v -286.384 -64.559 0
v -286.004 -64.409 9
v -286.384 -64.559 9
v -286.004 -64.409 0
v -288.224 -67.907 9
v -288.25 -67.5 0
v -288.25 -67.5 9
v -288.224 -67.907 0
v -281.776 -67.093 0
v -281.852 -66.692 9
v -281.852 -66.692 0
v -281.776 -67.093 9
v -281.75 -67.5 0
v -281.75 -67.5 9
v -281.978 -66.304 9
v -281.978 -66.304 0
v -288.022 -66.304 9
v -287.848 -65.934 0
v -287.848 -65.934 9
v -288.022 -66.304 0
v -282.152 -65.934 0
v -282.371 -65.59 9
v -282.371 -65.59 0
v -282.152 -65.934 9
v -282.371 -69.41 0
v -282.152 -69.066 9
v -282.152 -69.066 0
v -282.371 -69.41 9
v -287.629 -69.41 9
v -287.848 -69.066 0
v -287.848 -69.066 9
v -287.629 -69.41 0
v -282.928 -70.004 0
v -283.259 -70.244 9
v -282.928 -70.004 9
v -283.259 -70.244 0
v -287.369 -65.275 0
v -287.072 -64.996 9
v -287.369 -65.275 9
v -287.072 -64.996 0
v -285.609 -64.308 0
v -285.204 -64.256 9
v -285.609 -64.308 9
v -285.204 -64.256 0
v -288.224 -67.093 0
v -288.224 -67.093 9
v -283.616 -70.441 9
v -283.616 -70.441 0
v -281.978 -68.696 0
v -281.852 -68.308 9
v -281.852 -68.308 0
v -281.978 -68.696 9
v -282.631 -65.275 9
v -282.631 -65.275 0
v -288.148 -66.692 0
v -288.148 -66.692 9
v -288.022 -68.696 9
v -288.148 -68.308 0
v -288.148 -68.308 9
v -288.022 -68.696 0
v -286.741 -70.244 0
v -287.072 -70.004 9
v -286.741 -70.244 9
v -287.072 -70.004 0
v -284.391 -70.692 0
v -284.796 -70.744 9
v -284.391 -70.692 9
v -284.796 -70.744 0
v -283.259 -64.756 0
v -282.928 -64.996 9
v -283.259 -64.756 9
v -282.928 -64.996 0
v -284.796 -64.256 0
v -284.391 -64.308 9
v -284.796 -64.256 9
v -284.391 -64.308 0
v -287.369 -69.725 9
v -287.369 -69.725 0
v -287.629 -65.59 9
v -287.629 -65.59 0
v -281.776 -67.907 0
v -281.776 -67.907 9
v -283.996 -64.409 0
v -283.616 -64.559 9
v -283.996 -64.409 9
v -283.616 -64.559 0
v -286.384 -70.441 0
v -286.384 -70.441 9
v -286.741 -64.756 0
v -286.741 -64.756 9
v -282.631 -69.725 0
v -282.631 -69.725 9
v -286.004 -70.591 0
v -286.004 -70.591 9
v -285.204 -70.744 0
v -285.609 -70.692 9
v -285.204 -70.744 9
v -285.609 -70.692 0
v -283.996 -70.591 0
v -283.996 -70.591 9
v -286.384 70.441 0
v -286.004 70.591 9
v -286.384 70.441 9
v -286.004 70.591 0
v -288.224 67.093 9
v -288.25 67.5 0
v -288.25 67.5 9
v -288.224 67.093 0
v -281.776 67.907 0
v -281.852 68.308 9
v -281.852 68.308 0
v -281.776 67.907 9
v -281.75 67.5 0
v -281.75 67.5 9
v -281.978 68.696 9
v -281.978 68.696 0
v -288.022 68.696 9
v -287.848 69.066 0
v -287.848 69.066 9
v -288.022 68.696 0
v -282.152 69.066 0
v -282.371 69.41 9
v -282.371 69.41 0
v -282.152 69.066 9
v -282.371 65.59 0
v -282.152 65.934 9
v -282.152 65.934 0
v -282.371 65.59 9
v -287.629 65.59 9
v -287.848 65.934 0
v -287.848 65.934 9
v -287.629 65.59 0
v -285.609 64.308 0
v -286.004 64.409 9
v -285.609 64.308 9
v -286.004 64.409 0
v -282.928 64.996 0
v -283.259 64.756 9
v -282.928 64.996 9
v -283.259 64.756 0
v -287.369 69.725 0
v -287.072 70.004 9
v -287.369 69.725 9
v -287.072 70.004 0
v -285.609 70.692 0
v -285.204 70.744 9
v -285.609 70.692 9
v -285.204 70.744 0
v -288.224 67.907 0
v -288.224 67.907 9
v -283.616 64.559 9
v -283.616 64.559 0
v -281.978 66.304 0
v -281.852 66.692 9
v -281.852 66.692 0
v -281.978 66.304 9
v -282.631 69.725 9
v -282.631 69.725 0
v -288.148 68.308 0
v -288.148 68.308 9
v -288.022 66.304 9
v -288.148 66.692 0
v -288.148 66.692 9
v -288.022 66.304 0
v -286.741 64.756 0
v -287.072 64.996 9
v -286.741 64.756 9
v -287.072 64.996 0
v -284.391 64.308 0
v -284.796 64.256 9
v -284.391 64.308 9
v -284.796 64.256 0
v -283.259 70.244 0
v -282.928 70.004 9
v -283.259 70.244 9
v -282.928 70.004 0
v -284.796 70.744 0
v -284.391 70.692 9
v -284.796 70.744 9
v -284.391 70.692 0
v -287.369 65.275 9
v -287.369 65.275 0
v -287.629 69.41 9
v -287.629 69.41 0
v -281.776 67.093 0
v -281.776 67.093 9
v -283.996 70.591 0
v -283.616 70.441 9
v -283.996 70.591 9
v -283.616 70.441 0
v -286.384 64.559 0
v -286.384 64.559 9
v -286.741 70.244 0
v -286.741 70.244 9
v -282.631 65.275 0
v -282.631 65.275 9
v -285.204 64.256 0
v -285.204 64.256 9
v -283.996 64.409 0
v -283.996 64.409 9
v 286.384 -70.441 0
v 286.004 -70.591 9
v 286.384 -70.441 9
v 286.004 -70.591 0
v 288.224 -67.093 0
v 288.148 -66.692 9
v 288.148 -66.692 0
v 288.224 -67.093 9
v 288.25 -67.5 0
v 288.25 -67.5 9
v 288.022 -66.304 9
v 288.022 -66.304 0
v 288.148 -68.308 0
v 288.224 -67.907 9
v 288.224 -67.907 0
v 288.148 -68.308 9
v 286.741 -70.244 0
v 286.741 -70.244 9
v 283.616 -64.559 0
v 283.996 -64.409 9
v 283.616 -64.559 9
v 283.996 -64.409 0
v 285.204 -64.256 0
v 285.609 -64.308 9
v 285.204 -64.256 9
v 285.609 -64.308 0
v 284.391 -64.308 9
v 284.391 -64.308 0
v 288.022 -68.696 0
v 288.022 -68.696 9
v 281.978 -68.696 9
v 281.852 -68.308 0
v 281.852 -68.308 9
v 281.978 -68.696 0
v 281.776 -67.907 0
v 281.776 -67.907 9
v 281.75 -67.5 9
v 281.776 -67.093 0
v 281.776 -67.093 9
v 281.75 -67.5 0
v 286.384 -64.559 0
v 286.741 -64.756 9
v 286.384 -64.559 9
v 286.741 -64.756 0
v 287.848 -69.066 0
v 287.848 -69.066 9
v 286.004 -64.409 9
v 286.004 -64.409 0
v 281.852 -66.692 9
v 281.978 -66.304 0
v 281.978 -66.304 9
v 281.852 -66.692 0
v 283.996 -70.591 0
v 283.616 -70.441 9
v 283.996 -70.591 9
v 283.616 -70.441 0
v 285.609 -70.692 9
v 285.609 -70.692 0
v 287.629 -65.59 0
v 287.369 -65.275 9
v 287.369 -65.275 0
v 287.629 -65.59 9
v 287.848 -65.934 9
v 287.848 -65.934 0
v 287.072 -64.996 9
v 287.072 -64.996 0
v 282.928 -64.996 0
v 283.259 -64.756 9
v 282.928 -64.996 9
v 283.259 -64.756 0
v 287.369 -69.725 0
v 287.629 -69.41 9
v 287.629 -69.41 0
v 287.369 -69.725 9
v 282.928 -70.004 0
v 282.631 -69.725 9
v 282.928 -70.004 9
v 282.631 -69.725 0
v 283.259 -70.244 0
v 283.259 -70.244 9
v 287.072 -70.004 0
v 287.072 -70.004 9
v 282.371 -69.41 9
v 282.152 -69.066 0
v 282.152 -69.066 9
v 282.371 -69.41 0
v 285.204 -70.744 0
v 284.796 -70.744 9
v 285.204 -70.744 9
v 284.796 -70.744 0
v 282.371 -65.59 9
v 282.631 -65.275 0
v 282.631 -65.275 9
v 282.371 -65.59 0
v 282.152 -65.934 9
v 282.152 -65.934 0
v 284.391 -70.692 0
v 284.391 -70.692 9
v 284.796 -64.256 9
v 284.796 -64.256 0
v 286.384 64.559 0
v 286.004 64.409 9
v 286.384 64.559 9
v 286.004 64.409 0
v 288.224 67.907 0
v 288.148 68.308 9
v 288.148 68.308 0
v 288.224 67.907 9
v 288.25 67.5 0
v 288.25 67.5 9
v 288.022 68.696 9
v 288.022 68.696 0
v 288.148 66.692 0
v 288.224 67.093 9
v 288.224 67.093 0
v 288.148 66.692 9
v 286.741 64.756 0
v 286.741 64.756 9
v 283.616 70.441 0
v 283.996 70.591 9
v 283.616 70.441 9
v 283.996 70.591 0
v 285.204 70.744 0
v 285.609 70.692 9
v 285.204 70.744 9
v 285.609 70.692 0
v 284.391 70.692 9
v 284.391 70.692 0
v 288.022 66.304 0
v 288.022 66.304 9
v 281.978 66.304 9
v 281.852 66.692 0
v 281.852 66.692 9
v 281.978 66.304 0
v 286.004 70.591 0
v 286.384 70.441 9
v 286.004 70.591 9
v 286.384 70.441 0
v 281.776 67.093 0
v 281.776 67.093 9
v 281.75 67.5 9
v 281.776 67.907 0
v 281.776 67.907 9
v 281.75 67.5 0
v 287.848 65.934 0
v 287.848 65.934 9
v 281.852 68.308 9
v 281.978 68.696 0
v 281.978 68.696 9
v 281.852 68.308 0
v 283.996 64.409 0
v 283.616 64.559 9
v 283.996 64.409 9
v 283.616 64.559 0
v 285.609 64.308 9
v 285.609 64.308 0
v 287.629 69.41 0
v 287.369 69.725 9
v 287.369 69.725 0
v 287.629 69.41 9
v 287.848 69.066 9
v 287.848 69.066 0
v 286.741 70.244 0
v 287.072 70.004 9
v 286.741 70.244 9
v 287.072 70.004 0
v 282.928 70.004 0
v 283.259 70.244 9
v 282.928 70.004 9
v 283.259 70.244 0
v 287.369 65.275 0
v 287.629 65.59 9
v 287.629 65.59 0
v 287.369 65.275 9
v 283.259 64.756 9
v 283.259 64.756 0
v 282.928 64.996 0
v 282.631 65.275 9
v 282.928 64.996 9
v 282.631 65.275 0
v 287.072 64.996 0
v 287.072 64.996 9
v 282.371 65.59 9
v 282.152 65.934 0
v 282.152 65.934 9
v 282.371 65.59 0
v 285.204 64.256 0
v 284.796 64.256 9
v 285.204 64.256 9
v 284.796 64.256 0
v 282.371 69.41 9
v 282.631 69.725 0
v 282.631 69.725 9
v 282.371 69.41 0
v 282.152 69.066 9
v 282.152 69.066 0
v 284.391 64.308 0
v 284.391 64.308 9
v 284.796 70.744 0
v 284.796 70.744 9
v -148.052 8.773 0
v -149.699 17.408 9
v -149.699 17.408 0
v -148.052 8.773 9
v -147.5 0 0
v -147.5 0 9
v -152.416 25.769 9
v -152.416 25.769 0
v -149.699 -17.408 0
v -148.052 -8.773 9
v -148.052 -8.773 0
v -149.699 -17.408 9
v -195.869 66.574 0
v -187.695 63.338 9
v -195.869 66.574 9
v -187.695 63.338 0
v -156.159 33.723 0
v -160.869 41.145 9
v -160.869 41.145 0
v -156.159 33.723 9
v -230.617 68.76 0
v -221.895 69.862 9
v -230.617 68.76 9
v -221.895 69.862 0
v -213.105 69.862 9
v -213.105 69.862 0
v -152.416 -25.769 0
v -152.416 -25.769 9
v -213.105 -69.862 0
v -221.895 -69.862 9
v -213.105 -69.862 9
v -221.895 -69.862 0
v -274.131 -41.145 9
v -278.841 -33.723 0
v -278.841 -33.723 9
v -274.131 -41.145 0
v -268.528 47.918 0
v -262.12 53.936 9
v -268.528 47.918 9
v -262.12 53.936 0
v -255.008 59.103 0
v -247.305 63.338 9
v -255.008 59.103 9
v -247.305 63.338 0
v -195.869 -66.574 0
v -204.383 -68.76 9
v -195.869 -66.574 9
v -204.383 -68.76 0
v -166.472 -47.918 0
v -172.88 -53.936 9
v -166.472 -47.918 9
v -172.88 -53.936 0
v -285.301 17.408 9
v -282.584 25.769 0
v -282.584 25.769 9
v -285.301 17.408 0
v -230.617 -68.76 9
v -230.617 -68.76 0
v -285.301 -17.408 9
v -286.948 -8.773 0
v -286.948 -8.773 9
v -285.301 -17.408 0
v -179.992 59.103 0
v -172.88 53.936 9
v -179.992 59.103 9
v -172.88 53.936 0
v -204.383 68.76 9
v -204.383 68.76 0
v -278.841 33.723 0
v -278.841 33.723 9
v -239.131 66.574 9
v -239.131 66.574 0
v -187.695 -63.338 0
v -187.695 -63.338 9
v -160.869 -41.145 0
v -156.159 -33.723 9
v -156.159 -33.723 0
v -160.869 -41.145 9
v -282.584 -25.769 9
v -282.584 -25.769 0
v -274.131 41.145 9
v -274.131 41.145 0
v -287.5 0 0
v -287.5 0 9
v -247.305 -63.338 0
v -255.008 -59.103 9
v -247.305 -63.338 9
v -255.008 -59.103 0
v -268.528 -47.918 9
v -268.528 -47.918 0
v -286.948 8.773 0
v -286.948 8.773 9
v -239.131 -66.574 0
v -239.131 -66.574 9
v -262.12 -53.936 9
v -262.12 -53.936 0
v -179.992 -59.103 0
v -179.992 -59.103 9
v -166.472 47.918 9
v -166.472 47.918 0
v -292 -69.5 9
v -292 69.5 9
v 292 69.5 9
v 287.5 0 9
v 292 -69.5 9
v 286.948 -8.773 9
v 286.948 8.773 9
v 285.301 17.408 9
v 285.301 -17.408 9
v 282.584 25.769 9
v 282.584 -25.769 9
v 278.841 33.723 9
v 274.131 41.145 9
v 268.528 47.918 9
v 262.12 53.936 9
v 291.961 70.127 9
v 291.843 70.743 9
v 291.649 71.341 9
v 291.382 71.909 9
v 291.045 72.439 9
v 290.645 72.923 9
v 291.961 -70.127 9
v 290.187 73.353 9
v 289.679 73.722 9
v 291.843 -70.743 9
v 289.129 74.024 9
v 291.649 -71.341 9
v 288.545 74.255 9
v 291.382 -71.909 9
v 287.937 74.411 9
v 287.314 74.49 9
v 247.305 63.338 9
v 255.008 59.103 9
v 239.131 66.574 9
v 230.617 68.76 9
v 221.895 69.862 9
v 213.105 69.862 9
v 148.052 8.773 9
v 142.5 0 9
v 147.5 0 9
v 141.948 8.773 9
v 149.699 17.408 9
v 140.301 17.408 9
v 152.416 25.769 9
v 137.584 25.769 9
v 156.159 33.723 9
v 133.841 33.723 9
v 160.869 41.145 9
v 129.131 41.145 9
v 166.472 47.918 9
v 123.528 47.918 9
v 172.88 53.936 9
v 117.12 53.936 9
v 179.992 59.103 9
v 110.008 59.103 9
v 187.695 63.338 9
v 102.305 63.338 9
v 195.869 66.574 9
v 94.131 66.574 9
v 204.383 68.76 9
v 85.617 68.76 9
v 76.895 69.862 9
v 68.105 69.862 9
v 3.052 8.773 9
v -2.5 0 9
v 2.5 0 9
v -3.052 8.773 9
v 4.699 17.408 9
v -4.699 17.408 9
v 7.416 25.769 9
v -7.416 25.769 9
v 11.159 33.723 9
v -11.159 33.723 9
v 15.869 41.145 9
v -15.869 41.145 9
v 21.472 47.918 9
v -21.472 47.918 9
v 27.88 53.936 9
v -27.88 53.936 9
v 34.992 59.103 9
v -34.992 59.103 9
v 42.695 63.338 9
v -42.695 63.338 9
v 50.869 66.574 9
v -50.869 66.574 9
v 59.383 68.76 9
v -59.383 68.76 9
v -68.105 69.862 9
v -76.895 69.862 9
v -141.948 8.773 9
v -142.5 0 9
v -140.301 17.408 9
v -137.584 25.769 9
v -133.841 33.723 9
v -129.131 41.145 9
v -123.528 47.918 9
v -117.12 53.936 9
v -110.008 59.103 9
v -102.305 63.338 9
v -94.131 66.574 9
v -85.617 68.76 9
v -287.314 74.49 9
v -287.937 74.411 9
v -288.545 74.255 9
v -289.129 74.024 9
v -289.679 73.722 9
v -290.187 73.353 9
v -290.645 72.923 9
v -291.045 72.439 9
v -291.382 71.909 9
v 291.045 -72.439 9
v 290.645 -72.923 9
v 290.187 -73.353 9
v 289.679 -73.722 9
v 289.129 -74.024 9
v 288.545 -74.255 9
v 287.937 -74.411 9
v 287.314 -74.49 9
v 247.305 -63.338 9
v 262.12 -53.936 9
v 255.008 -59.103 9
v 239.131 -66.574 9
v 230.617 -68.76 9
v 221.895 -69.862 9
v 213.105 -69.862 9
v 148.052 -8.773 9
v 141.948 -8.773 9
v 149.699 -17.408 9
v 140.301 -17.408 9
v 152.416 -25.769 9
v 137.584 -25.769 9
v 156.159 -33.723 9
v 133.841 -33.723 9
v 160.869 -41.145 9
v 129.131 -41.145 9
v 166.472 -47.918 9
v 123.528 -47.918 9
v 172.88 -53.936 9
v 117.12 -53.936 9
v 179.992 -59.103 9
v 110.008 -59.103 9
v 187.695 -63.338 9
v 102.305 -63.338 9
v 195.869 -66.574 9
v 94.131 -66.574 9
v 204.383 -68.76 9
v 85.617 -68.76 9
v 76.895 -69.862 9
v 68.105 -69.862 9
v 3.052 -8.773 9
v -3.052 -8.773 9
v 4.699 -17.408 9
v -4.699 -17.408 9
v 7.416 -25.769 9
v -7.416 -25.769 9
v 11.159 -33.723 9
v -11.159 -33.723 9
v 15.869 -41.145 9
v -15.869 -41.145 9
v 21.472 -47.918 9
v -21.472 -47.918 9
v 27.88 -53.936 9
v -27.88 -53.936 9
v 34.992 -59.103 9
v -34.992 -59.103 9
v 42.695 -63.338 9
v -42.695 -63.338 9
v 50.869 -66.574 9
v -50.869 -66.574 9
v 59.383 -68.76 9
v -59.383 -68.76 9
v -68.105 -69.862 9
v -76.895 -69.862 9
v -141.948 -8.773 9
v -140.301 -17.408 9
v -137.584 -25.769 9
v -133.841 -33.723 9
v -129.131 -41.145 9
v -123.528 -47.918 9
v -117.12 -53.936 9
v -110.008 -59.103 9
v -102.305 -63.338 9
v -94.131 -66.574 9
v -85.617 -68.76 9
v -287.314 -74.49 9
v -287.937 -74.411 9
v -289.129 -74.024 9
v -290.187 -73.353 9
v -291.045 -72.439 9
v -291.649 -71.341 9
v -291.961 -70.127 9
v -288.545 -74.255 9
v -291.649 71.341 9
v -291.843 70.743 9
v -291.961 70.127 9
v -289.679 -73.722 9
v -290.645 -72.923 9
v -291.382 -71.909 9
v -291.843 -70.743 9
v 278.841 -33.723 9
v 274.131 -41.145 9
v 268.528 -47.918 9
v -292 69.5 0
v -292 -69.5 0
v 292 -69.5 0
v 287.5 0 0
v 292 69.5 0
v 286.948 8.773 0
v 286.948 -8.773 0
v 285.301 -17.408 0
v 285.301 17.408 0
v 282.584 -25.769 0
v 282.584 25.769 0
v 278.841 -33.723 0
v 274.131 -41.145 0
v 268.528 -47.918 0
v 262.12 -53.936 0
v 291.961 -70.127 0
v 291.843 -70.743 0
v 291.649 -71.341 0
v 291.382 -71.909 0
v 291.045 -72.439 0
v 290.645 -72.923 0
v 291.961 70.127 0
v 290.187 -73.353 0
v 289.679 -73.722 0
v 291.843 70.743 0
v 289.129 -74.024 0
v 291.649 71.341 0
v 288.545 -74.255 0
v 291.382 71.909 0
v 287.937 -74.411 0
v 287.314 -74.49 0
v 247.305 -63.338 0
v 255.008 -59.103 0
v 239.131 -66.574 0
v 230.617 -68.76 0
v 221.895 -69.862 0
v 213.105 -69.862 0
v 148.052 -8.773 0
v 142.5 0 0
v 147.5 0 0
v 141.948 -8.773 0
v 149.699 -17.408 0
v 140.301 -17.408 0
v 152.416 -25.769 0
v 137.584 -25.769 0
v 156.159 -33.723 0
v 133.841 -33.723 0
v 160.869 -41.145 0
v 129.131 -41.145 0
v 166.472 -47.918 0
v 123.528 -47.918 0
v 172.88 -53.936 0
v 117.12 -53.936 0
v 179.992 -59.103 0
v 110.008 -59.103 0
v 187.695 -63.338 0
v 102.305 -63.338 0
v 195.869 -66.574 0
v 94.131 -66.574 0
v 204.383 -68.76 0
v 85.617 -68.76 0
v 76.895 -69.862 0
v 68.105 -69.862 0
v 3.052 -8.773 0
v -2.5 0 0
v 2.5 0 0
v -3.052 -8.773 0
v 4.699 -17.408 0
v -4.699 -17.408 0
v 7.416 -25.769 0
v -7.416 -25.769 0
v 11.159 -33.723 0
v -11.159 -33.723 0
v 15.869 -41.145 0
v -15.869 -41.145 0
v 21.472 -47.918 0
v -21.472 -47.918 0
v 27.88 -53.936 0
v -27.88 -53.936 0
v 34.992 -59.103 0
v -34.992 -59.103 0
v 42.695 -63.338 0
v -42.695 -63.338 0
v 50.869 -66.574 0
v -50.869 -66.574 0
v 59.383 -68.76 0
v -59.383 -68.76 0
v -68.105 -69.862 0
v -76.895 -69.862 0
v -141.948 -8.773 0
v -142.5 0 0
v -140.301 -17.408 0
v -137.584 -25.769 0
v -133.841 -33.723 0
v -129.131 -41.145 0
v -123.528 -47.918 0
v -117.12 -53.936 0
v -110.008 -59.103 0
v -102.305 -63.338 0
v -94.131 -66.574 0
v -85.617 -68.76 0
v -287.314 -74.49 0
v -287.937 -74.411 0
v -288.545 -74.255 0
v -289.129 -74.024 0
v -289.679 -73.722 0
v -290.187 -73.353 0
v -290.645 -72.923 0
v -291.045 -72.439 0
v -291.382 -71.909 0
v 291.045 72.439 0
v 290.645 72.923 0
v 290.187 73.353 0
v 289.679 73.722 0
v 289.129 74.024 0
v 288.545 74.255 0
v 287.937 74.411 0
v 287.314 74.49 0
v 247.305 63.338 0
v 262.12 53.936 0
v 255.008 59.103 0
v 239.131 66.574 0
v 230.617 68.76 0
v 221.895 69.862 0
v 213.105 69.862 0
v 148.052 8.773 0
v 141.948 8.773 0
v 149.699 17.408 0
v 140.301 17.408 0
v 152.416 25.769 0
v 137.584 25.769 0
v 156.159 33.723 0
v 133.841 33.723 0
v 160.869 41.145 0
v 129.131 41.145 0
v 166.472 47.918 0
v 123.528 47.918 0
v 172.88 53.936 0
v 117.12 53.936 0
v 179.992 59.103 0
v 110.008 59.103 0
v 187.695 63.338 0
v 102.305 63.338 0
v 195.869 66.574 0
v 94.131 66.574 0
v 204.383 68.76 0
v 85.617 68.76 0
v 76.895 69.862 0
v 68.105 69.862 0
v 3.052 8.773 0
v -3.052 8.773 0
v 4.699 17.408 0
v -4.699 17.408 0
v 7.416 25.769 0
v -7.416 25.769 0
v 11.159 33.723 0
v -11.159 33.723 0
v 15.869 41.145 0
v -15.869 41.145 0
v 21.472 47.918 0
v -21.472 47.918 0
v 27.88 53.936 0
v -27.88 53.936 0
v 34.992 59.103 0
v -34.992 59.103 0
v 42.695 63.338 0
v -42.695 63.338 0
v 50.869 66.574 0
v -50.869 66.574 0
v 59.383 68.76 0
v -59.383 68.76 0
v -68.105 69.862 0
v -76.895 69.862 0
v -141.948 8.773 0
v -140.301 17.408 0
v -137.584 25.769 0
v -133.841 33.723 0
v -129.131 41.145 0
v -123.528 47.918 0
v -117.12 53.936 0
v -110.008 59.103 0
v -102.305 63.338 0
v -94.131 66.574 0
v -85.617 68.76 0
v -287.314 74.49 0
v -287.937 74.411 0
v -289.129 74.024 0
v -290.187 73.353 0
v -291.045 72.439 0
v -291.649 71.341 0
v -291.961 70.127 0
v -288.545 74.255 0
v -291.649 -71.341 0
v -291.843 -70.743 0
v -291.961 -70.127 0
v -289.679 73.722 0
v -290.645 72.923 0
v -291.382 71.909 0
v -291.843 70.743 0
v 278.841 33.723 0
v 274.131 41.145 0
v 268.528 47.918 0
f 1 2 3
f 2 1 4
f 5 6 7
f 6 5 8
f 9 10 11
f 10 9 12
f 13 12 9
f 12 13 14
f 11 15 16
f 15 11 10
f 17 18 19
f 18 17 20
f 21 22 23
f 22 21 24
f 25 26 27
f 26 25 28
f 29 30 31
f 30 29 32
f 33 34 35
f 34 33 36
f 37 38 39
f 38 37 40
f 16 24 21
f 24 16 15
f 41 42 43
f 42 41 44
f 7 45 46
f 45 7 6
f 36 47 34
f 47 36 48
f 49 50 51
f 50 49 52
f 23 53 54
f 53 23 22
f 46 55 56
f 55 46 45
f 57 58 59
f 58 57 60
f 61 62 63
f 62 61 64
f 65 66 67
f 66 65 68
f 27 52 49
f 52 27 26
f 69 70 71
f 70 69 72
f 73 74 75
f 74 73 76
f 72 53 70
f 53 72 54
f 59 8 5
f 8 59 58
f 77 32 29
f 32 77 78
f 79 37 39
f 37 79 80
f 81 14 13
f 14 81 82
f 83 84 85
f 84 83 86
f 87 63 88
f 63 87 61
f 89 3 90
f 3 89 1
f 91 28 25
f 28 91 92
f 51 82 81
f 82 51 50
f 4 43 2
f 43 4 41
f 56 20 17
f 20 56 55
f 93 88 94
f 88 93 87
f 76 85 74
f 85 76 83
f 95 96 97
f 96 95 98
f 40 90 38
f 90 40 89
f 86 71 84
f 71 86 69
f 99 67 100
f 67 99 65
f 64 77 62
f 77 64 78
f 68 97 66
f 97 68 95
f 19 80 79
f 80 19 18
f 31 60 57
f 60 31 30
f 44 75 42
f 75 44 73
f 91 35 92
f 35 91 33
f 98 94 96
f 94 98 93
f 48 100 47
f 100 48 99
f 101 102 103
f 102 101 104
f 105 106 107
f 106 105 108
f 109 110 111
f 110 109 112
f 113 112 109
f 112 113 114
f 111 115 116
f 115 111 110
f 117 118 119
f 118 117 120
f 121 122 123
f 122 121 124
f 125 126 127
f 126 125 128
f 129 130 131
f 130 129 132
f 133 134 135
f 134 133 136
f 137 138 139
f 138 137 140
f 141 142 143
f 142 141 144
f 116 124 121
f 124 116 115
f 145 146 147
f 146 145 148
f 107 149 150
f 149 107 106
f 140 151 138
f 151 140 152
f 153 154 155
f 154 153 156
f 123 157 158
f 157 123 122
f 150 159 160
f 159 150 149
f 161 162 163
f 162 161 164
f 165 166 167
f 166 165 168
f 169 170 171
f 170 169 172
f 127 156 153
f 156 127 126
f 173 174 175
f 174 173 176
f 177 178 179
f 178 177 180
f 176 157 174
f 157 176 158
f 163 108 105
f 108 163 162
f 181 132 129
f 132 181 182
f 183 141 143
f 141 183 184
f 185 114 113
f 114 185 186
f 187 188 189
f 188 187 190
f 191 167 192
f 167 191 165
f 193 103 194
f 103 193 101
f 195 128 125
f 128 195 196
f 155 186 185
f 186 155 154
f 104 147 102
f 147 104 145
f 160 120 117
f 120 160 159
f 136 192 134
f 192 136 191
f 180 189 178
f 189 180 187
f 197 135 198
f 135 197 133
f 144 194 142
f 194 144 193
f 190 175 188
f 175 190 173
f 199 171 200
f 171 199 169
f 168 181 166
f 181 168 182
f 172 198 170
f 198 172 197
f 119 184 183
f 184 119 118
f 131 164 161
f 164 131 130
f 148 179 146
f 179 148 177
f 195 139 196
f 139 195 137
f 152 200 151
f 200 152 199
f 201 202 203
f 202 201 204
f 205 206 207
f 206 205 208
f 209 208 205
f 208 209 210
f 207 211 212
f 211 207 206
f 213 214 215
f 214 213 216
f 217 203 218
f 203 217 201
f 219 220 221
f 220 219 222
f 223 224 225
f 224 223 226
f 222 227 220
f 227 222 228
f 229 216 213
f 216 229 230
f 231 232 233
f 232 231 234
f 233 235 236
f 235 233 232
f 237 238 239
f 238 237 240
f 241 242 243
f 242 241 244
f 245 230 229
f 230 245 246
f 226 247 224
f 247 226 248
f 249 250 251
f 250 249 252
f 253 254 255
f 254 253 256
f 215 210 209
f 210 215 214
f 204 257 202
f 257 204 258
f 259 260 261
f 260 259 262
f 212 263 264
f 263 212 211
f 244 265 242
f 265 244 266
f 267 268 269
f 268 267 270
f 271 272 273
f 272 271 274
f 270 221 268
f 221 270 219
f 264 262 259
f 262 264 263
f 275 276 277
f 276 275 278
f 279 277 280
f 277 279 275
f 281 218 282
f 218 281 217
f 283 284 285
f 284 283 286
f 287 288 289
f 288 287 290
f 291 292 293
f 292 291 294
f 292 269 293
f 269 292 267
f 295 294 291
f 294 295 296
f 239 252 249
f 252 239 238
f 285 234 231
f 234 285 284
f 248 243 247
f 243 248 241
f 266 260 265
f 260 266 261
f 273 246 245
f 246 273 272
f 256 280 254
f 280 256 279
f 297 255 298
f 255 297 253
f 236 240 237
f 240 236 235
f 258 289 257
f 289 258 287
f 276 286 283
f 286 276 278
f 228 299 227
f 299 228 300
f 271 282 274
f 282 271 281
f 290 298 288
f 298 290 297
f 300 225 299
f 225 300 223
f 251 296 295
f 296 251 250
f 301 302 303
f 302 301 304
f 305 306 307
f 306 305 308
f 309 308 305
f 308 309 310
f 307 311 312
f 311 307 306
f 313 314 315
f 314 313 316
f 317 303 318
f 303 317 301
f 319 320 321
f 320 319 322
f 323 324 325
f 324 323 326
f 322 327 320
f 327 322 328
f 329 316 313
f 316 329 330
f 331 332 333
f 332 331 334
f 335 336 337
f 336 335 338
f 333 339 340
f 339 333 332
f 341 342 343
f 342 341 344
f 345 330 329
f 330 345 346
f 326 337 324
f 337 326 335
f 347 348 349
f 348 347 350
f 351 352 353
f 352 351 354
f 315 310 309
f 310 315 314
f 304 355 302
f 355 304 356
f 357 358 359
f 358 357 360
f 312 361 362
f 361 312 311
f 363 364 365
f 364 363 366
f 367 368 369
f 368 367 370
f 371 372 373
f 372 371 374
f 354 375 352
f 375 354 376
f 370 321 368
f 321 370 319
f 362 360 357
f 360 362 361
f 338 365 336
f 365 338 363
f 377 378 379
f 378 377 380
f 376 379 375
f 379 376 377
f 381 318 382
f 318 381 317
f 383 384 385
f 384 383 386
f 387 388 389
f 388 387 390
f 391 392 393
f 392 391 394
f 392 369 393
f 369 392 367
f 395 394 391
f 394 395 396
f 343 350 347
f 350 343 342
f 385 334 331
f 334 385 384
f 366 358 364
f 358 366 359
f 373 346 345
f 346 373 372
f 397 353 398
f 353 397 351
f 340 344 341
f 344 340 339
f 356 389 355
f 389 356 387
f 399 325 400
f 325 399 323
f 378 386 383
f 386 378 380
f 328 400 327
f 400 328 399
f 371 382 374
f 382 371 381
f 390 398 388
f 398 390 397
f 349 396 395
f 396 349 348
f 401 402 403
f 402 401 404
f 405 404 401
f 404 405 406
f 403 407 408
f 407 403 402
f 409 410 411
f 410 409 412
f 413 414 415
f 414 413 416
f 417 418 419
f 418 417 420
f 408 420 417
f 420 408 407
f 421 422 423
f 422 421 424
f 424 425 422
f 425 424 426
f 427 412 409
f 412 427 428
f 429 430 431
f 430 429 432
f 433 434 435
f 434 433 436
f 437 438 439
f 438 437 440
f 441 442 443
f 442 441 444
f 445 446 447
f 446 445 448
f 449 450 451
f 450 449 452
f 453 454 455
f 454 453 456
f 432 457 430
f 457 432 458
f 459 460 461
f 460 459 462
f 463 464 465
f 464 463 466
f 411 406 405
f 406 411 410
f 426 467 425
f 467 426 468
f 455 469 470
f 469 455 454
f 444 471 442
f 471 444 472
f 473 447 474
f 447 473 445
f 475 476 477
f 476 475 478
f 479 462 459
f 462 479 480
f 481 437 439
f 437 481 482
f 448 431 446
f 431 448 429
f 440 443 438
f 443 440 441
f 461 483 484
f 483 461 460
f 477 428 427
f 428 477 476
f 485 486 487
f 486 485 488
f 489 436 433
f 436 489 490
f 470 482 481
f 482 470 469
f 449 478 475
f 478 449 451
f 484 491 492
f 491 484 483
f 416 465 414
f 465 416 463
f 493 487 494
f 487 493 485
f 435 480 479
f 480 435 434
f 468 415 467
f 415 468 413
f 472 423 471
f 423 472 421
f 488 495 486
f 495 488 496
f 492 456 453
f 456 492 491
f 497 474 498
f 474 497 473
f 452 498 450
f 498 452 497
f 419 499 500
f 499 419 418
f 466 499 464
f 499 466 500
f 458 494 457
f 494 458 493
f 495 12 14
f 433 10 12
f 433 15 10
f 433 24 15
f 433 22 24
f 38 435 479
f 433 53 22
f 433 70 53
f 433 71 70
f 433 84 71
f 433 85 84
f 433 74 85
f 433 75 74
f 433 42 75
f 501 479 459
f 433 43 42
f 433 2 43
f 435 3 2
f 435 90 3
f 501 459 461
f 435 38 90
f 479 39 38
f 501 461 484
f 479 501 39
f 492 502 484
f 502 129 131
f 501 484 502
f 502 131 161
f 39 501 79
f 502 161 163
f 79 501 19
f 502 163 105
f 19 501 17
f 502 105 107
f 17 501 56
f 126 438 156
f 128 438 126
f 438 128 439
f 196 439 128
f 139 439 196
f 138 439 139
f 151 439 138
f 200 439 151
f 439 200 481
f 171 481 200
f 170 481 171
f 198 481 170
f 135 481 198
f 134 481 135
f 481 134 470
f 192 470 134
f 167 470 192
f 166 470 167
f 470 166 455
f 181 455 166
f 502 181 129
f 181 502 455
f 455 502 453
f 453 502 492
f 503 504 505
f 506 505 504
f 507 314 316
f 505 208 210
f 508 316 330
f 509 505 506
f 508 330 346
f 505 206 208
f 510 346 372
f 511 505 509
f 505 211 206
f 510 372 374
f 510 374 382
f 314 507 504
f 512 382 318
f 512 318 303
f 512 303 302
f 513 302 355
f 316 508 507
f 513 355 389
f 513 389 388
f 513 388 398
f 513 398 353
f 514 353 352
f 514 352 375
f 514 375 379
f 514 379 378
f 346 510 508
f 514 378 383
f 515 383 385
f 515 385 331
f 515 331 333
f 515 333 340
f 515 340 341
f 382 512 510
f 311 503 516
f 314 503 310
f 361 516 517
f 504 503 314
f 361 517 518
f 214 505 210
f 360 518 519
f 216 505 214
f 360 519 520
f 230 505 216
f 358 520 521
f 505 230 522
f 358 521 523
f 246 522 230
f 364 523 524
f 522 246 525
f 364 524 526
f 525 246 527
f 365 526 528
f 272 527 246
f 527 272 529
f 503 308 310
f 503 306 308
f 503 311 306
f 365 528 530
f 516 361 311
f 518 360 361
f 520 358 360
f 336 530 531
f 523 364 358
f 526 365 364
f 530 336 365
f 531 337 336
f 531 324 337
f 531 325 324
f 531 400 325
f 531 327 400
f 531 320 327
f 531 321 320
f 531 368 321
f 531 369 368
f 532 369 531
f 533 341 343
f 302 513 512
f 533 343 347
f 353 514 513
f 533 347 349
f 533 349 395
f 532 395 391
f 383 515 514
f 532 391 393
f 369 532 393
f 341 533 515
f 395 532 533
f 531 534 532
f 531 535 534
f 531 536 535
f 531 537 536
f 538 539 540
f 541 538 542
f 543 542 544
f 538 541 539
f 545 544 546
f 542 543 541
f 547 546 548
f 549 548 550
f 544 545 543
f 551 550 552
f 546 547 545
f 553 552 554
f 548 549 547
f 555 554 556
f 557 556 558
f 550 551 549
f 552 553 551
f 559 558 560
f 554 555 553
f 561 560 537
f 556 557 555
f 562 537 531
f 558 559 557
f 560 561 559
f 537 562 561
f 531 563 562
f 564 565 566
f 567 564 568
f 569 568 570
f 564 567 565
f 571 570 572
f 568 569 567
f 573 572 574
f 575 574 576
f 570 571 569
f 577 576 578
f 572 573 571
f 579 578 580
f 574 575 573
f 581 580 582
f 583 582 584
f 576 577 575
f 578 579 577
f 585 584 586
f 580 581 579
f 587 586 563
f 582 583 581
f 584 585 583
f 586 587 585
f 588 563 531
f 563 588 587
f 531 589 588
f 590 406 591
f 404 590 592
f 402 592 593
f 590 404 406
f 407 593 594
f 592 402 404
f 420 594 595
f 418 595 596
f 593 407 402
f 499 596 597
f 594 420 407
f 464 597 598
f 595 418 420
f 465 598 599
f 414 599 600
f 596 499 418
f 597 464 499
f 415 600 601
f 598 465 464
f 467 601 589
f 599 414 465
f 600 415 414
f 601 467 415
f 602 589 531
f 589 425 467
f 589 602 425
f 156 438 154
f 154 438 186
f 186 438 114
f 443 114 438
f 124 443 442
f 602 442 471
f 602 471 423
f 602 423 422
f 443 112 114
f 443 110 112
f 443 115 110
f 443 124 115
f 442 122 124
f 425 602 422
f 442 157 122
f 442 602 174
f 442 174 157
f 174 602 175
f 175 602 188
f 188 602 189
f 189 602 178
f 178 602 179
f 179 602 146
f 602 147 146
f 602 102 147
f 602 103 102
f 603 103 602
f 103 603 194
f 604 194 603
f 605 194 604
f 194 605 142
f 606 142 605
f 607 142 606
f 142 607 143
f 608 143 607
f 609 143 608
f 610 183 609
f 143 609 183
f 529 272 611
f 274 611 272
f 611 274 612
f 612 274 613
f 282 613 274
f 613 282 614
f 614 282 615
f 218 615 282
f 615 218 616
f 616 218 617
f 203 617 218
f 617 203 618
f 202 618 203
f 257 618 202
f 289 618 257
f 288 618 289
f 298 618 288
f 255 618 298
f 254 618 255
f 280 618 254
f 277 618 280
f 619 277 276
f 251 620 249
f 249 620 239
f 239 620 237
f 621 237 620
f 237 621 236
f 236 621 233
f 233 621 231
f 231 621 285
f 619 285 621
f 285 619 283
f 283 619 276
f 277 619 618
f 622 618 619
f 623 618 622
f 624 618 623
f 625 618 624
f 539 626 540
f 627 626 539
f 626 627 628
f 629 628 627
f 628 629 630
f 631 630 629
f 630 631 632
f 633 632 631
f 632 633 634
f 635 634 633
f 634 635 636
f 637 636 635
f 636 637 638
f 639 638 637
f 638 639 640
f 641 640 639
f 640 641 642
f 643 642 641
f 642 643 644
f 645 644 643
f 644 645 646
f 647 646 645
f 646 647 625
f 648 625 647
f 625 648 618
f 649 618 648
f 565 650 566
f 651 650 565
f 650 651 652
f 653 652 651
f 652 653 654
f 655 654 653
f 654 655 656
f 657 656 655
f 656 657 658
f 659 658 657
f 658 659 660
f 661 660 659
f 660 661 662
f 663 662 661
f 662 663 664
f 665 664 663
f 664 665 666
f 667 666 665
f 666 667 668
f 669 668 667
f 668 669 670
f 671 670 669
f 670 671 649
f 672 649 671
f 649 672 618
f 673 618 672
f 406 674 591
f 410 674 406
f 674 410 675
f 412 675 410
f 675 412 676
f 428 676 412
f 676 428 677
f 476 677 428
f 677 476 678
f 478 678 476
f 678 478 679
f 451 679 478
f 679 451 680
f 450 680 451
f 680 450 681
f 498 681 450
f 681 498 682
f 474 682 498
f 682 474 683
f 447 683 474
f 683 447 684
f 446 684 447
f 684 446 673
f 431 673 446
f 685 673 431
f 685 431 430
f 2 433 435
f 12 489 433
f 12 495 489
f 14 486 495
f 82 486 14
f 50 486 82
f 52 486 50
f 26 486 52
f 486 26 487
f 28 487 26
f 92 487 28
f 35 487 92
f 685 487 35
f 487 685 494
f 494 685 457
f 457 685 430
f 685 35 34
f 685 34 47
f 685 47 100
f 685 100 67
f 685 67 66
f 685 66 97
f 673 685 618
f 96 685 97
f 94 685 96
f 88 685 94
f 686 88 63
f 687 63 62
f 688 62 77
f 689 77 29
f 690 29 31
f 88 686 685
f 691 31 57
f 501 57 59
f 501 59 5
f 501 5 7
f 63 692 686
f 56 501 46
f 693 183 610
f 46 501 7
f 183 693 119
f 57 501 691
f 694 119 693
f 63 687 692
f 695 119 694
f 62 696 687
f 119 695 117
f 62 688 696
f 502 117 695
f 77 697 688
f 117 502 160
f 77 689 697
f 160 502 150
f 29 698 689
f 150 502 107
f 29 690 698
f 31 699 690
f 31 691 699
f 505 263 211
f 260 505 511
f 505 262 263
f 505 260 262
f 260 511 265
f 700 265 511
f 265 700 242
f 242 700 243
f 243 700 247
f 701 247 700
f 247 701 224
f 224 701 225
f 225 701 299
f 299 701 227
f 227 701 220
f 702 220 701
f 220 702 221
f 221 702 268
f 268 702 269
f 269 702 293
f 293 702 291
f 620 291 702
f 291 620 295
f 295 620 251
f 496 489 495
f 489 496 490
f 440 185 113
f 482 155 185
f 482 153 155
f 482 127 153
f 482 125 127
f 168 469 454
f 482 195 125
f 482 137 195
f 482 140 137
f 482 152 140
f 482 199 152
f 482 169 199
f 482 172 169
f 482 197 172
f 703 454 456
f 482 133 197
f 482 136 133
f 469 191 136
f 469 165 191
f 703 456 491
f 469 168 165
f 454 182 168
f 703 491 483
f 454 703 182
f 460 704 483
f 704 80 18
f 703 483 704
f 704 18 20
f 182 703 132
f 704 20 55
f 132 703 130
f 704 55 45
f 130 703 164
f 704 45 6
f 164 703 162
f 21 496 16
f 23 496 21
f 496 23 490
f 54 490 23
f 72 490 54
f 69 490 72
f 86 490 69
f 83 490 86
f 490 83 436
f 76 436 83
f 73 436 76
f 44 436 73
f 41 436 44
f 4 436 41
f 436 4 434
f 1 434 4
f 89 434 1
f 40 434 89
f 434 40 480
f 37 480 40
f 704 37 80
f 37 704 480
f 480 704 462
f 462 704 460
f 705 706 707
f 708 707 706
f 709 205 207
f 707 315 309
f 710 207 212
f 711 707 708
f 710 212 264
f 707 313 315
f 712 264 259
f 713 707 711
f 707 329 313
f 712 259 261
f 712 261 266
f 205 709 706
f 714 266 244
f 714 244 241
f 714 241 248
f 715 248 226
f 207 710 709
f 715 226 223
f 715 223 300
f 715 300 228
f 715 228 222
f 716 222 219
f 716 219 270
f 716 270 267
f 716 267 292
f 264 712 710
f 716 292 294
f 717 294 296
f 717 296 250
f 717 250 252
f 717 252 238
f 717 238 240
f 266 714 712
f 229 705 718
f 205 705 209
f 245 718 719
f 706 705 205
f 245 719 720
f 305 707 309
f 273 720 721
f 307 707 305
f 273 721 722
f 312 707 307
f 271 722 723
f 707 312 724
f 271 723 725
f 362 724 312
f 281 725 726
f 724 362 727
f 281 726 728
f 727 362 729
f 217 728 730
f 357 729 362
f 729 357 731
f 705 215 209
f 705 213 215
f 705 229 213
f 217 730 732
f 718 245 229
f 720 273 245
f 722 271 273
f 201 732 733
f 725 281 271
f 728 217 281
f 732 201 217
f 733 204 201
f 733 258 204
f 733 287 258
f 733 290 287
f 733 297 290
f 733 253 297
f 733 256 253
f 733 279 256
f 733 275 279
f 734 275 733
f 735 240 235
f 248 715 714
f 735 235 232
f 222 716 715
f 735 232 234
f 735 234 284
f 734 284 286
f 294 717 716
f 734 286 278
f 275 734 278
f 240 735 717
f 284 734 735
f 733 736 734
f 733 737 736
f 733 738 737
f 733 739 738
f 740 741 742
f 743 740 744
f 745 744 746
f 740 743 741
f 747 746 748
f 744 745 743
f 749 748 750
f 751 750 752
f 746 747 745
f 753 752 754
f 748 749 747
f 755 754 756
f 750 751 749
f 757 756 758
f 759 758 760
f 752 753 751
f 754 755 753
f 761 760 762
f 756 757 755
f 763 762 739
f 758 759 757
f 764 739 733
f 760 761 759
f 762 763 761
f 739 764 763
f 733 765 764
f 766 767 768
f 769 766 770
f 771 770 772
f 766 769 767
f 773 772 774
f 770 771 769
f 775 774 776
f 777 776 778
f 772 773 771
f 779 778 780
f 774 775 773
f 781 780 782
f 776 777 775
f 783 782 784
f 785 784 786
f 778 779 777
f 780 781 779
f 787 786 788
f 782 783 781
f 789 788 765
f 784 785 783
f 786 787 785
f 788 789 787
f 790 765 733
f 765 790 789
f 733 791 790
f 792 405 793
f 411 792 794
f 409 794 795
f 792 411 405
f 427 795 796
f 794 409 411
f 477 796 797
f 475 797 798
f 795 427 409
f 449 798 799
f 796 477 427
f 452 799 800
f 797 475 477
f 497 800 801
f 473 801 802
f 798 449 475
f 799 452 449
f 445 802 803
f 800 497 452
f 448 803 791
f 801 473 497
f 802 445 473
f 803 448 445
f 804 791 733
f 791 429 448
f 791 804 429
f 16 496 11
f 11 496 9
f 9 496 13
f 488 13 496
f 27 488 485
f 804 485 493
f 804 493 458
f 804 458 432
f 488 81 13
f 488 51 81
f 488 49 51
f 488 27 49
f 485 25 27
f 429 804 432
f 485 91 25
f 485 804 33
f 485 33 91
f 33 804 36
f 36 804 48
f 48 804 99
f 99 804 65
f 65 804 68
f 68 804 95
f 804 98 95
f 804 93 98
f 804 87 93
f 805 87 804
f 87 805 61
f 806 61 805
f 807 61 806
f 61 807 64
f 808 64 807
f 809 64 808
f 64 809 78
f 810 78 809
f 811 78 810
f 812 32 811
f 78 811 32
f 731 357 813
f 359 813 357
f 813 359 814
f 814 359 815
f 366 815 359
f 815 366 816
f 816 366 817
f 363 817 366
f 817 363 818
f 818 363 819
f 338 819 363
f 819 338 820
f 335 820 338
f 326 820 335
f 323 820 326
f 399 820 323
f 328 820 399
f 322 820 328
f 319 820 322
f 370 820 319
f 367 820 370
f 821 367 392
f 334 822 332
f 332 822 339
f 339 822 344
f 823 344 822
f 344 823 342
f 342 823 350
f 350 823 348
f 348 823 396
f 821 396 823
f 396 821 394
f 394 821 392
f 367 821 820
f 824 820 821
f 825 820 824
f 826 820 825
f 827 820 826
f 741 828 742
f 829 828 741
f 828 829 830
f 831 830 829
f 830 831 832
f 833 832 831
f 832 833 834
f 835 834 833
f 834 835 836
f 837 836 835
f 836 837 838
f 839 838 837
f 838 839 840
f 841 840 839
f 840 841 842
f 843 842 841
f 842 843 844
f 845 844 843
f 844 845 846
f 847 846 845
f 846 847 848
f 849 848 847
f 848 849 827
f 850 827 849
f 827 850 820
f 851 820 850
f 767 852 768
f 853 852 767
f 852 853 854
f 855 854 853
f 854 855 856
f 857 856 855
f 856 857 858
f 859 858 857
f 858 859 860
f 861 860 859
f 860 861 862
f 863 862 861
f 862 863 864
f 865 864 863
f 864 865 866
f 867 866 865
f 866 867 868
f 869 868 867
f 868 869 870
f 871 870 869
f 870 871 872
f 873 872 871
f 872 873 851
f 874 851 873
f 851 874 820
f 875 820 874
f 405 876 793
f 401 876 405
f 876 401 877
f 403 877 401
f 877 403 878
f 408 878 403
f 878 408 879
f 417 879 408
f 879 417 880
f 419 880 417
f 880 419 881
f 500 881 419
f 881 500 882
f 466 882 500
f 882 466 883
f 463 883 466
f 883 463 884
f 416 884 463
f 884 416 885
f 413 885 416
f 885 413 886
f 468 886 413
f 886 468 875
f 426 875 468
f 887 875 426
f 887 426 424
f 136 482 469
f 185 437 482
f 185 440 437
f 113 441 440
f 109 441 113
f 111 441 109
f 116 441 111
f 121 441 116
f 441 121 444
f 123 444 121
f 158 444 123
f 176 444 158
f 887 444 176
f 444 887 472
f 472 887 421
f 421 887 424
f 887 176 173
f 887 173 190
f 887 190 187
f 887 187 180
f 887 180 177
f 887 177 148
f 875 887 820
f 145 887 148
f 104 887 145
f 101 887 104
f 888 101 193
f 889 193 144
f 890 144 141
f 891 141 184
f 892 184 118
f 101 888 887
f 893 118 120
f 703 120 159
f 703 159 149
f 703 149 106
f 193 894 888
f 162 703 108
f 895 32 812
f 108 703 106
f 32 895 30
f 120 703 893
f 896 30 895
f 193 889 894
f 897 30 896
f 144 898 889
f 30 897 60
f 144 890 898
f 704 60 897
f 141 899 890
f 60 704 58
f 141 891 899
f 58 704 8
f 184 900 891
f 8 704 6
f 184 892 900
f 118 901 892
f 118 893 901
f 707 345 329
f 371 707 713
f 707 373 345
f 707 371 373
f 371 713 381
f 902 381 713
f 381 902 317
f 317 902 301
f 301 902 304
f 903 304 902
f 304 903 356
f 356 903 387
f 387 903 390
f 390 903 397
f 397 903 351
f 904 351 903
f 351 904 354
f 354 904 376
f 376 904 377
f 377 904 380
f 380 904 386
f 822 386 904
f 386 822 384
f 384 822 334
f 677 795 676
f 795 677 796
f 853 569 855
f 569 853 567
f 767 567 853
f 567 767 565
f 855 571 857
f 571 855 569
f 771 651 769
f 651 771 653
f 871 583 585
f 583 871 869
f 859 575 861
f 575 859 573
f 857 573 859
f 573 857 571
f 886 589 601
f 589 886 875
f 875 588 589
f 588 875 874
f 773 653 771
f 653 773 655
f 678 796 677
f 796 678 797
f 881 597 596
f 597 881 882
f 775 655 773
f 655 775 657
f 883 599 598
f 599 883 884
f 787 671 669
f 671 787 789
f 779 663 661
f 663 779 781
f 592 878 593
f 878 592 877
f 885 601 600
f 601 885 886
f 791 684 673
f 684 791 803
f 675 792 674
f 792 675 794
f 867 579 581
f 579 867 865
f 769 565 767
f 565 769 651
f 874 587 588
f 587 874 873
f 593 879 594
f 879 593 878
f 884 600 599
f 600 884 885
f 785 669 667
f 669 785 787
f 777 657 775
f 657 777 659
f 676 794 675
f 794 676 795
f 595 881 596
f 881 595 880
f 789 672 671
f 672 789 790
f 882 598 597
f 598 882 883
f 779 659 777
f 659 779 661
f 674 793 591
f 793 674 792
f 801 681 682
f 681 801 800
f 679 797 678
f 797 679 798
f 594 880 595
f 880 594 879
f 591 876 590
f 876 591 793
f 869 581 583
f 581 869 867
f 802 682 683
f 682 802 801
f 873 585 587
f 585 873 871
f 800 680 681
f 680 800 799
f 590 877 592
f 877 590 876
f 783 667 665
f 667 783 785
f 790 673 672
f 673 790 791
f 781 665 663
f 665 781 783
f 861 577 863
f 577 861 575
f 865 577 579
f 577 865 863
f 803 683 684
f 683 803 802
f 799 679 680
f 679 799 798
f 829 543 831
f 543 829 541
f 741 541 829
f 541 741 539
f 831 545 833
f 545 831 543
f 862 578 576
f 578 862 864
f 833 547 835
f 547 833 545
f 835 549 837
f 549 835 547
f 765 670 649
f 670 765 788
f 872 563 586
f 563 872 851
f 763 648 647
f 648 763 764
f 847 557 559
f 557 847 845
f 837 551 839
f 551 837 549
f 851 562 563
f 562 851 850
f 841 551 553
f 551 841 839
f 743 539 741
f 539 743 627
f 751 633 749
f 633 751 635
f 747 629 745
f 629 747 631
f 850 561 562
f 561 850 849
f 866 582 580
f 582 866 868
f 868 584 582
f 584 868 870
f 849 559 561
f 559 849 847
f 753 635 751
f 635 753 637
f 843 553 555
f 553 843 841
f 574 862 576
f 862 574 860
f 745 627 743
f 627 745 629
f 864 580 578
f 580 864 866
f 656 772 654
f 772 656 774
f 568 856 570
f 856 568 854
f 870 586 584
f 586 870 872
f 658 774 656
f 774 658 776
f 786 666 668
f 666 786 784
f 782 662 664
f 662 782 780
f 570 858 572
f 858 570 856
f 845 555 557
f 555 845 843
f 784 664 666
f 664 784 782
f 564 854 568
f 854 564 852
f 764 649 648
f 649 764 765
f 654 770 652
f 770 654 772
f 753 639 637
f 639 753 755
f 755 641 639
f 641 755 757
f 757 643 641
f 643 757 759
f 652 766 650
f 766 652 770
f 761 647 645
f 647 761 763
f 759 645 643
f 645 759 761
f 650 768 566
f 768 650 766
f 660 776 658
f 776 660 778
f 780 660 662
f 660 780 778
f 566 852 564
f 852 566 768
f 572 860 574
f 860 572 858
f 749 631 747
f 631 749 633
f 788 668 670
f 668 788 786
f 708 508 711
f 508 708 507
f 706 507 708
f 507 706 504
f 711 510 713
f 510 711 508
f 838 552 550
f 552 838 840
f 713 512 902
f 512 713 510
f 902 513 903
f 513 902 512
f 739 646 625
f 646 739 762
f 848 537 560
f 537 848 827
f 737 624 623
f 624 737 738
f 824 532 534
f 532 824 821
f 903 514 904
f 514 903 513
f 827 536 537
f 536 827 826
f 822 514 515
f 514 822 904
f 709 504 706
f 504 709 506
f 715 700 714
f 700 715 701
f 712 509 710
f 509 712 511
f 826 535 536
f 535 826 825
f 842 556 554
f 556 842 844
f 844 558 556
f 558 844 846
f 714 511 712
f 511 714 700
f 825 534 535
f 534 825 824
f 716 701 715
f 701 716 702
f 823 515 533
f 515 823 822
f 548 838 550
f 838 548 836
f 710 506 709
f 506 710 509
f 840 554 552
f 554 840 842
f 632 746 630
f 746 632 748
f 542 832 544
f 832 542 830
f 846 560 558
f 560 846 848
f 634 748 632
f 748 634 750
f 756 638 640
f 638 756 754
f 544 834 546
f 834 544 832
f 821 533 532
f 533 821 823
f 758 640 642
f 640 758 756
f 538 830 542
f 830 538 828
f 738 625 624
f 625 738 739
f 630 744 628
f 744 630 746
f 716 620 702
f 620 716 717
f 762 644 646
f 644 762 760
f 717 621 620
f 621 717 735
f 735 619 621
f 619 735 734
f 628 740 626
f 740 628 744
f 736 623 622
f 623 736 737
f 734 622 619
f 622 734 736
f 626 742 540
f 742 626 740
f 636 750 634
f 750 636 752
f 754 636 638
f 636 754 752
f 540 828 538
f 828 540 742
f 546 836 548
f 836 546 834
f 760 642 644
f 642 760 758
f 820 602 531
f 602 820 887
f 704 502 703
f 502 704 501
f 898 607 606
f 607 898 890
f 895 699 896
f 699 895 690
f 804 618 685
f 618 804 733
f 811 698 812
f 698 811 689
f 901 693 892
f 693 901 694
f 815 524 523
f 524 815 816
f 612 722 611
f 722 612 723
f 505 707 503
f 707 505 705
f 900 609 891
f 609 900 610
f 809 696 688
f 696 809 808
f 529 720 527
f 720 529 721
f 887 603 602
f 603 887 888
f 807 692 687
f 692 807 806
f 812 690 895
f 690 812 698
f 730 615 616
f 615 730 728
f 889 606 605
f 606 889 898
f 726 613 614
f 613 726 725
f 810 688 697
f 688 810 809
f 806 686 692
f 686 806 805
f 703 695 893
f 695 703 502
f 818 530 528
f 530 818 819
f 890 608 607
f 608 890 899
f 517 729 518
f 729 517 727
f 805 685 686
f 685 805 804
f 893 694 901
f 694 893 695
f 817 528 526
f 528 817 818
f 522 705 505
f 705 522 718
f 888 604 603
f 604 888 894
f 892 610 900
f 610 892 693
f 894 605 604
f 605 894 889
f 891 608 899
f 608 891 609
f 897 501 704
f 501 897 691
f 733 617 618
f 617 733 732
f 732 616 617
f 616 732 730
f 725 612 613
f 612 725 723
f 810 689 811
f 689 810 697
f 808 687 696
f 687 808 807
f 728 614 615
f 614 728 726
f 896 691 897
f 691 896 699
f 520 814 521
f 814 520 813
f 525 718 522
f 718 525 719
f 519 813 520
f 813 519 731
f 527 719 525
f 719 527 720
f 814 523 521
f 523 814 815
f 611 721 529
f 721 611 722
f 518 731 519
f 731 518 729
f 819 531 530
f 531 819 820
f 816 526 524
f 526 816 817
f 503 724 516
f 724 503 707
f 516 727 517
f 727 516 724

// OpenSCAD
$fn = 50;


difference() {
	union() {
		hull() {
			translate(v = [-287.0000000000, 69.5000000000, 0]) {
				cylinder(h = 9, r = 5);
			}
			translate(v = [287.0000000000, 69.5000000000, 0]) {
				cylinder(h = 9, r = 5);
			}
			translate(v = [-287.0000000000, -69.5000000000, 0]) {
				cylinder(h = 9, r = 5);
			}
			translate(v = [287.0000000000, -69.5000000000, 0]) {
				cylinder(h = 9, r = 5);
			}
		}
	}
	union() {
		#translate(v = [-285.0000000000, -67.5000000000, -100.0000000000]) {
			cylinder(h = 200, r = 3.2500000000);
		}
		#translate(v = [-285.0000000000, 67.5000000000, -100.0000000000]) {
			cylinder(h = 200, r = 3.2500000000);
		}
		#translate(v = [285.0000000000, -67.5000000000, -100.0000000000]) {
			cylinder(h = 200, r = 3.2500000000);
		}
		#translate(v = [285.0000000000, 67.5000000000, -100.0000000000]) {
			cylinder(h = 200, r = 3.2500000000);
		}
		#translate(v = [-217.5000000000, 0, 0]) {
			cylinder(h = 9, r = 70.0000000000);
		}
		#translate(v = [-72.5000000000, 0, 0]) {
			cylinder(h = 9, r = 70.0000000000);
		}
		#translate(v = [72.5000000000, 0, 0]) {
			cylinder(h = 9, r = 70.0000000000);
		}
		#translate(v = [217.5000000000, 0, 0]) {
			cylinder(h = 9, r = 70.0000000000);
		}
	}
}
